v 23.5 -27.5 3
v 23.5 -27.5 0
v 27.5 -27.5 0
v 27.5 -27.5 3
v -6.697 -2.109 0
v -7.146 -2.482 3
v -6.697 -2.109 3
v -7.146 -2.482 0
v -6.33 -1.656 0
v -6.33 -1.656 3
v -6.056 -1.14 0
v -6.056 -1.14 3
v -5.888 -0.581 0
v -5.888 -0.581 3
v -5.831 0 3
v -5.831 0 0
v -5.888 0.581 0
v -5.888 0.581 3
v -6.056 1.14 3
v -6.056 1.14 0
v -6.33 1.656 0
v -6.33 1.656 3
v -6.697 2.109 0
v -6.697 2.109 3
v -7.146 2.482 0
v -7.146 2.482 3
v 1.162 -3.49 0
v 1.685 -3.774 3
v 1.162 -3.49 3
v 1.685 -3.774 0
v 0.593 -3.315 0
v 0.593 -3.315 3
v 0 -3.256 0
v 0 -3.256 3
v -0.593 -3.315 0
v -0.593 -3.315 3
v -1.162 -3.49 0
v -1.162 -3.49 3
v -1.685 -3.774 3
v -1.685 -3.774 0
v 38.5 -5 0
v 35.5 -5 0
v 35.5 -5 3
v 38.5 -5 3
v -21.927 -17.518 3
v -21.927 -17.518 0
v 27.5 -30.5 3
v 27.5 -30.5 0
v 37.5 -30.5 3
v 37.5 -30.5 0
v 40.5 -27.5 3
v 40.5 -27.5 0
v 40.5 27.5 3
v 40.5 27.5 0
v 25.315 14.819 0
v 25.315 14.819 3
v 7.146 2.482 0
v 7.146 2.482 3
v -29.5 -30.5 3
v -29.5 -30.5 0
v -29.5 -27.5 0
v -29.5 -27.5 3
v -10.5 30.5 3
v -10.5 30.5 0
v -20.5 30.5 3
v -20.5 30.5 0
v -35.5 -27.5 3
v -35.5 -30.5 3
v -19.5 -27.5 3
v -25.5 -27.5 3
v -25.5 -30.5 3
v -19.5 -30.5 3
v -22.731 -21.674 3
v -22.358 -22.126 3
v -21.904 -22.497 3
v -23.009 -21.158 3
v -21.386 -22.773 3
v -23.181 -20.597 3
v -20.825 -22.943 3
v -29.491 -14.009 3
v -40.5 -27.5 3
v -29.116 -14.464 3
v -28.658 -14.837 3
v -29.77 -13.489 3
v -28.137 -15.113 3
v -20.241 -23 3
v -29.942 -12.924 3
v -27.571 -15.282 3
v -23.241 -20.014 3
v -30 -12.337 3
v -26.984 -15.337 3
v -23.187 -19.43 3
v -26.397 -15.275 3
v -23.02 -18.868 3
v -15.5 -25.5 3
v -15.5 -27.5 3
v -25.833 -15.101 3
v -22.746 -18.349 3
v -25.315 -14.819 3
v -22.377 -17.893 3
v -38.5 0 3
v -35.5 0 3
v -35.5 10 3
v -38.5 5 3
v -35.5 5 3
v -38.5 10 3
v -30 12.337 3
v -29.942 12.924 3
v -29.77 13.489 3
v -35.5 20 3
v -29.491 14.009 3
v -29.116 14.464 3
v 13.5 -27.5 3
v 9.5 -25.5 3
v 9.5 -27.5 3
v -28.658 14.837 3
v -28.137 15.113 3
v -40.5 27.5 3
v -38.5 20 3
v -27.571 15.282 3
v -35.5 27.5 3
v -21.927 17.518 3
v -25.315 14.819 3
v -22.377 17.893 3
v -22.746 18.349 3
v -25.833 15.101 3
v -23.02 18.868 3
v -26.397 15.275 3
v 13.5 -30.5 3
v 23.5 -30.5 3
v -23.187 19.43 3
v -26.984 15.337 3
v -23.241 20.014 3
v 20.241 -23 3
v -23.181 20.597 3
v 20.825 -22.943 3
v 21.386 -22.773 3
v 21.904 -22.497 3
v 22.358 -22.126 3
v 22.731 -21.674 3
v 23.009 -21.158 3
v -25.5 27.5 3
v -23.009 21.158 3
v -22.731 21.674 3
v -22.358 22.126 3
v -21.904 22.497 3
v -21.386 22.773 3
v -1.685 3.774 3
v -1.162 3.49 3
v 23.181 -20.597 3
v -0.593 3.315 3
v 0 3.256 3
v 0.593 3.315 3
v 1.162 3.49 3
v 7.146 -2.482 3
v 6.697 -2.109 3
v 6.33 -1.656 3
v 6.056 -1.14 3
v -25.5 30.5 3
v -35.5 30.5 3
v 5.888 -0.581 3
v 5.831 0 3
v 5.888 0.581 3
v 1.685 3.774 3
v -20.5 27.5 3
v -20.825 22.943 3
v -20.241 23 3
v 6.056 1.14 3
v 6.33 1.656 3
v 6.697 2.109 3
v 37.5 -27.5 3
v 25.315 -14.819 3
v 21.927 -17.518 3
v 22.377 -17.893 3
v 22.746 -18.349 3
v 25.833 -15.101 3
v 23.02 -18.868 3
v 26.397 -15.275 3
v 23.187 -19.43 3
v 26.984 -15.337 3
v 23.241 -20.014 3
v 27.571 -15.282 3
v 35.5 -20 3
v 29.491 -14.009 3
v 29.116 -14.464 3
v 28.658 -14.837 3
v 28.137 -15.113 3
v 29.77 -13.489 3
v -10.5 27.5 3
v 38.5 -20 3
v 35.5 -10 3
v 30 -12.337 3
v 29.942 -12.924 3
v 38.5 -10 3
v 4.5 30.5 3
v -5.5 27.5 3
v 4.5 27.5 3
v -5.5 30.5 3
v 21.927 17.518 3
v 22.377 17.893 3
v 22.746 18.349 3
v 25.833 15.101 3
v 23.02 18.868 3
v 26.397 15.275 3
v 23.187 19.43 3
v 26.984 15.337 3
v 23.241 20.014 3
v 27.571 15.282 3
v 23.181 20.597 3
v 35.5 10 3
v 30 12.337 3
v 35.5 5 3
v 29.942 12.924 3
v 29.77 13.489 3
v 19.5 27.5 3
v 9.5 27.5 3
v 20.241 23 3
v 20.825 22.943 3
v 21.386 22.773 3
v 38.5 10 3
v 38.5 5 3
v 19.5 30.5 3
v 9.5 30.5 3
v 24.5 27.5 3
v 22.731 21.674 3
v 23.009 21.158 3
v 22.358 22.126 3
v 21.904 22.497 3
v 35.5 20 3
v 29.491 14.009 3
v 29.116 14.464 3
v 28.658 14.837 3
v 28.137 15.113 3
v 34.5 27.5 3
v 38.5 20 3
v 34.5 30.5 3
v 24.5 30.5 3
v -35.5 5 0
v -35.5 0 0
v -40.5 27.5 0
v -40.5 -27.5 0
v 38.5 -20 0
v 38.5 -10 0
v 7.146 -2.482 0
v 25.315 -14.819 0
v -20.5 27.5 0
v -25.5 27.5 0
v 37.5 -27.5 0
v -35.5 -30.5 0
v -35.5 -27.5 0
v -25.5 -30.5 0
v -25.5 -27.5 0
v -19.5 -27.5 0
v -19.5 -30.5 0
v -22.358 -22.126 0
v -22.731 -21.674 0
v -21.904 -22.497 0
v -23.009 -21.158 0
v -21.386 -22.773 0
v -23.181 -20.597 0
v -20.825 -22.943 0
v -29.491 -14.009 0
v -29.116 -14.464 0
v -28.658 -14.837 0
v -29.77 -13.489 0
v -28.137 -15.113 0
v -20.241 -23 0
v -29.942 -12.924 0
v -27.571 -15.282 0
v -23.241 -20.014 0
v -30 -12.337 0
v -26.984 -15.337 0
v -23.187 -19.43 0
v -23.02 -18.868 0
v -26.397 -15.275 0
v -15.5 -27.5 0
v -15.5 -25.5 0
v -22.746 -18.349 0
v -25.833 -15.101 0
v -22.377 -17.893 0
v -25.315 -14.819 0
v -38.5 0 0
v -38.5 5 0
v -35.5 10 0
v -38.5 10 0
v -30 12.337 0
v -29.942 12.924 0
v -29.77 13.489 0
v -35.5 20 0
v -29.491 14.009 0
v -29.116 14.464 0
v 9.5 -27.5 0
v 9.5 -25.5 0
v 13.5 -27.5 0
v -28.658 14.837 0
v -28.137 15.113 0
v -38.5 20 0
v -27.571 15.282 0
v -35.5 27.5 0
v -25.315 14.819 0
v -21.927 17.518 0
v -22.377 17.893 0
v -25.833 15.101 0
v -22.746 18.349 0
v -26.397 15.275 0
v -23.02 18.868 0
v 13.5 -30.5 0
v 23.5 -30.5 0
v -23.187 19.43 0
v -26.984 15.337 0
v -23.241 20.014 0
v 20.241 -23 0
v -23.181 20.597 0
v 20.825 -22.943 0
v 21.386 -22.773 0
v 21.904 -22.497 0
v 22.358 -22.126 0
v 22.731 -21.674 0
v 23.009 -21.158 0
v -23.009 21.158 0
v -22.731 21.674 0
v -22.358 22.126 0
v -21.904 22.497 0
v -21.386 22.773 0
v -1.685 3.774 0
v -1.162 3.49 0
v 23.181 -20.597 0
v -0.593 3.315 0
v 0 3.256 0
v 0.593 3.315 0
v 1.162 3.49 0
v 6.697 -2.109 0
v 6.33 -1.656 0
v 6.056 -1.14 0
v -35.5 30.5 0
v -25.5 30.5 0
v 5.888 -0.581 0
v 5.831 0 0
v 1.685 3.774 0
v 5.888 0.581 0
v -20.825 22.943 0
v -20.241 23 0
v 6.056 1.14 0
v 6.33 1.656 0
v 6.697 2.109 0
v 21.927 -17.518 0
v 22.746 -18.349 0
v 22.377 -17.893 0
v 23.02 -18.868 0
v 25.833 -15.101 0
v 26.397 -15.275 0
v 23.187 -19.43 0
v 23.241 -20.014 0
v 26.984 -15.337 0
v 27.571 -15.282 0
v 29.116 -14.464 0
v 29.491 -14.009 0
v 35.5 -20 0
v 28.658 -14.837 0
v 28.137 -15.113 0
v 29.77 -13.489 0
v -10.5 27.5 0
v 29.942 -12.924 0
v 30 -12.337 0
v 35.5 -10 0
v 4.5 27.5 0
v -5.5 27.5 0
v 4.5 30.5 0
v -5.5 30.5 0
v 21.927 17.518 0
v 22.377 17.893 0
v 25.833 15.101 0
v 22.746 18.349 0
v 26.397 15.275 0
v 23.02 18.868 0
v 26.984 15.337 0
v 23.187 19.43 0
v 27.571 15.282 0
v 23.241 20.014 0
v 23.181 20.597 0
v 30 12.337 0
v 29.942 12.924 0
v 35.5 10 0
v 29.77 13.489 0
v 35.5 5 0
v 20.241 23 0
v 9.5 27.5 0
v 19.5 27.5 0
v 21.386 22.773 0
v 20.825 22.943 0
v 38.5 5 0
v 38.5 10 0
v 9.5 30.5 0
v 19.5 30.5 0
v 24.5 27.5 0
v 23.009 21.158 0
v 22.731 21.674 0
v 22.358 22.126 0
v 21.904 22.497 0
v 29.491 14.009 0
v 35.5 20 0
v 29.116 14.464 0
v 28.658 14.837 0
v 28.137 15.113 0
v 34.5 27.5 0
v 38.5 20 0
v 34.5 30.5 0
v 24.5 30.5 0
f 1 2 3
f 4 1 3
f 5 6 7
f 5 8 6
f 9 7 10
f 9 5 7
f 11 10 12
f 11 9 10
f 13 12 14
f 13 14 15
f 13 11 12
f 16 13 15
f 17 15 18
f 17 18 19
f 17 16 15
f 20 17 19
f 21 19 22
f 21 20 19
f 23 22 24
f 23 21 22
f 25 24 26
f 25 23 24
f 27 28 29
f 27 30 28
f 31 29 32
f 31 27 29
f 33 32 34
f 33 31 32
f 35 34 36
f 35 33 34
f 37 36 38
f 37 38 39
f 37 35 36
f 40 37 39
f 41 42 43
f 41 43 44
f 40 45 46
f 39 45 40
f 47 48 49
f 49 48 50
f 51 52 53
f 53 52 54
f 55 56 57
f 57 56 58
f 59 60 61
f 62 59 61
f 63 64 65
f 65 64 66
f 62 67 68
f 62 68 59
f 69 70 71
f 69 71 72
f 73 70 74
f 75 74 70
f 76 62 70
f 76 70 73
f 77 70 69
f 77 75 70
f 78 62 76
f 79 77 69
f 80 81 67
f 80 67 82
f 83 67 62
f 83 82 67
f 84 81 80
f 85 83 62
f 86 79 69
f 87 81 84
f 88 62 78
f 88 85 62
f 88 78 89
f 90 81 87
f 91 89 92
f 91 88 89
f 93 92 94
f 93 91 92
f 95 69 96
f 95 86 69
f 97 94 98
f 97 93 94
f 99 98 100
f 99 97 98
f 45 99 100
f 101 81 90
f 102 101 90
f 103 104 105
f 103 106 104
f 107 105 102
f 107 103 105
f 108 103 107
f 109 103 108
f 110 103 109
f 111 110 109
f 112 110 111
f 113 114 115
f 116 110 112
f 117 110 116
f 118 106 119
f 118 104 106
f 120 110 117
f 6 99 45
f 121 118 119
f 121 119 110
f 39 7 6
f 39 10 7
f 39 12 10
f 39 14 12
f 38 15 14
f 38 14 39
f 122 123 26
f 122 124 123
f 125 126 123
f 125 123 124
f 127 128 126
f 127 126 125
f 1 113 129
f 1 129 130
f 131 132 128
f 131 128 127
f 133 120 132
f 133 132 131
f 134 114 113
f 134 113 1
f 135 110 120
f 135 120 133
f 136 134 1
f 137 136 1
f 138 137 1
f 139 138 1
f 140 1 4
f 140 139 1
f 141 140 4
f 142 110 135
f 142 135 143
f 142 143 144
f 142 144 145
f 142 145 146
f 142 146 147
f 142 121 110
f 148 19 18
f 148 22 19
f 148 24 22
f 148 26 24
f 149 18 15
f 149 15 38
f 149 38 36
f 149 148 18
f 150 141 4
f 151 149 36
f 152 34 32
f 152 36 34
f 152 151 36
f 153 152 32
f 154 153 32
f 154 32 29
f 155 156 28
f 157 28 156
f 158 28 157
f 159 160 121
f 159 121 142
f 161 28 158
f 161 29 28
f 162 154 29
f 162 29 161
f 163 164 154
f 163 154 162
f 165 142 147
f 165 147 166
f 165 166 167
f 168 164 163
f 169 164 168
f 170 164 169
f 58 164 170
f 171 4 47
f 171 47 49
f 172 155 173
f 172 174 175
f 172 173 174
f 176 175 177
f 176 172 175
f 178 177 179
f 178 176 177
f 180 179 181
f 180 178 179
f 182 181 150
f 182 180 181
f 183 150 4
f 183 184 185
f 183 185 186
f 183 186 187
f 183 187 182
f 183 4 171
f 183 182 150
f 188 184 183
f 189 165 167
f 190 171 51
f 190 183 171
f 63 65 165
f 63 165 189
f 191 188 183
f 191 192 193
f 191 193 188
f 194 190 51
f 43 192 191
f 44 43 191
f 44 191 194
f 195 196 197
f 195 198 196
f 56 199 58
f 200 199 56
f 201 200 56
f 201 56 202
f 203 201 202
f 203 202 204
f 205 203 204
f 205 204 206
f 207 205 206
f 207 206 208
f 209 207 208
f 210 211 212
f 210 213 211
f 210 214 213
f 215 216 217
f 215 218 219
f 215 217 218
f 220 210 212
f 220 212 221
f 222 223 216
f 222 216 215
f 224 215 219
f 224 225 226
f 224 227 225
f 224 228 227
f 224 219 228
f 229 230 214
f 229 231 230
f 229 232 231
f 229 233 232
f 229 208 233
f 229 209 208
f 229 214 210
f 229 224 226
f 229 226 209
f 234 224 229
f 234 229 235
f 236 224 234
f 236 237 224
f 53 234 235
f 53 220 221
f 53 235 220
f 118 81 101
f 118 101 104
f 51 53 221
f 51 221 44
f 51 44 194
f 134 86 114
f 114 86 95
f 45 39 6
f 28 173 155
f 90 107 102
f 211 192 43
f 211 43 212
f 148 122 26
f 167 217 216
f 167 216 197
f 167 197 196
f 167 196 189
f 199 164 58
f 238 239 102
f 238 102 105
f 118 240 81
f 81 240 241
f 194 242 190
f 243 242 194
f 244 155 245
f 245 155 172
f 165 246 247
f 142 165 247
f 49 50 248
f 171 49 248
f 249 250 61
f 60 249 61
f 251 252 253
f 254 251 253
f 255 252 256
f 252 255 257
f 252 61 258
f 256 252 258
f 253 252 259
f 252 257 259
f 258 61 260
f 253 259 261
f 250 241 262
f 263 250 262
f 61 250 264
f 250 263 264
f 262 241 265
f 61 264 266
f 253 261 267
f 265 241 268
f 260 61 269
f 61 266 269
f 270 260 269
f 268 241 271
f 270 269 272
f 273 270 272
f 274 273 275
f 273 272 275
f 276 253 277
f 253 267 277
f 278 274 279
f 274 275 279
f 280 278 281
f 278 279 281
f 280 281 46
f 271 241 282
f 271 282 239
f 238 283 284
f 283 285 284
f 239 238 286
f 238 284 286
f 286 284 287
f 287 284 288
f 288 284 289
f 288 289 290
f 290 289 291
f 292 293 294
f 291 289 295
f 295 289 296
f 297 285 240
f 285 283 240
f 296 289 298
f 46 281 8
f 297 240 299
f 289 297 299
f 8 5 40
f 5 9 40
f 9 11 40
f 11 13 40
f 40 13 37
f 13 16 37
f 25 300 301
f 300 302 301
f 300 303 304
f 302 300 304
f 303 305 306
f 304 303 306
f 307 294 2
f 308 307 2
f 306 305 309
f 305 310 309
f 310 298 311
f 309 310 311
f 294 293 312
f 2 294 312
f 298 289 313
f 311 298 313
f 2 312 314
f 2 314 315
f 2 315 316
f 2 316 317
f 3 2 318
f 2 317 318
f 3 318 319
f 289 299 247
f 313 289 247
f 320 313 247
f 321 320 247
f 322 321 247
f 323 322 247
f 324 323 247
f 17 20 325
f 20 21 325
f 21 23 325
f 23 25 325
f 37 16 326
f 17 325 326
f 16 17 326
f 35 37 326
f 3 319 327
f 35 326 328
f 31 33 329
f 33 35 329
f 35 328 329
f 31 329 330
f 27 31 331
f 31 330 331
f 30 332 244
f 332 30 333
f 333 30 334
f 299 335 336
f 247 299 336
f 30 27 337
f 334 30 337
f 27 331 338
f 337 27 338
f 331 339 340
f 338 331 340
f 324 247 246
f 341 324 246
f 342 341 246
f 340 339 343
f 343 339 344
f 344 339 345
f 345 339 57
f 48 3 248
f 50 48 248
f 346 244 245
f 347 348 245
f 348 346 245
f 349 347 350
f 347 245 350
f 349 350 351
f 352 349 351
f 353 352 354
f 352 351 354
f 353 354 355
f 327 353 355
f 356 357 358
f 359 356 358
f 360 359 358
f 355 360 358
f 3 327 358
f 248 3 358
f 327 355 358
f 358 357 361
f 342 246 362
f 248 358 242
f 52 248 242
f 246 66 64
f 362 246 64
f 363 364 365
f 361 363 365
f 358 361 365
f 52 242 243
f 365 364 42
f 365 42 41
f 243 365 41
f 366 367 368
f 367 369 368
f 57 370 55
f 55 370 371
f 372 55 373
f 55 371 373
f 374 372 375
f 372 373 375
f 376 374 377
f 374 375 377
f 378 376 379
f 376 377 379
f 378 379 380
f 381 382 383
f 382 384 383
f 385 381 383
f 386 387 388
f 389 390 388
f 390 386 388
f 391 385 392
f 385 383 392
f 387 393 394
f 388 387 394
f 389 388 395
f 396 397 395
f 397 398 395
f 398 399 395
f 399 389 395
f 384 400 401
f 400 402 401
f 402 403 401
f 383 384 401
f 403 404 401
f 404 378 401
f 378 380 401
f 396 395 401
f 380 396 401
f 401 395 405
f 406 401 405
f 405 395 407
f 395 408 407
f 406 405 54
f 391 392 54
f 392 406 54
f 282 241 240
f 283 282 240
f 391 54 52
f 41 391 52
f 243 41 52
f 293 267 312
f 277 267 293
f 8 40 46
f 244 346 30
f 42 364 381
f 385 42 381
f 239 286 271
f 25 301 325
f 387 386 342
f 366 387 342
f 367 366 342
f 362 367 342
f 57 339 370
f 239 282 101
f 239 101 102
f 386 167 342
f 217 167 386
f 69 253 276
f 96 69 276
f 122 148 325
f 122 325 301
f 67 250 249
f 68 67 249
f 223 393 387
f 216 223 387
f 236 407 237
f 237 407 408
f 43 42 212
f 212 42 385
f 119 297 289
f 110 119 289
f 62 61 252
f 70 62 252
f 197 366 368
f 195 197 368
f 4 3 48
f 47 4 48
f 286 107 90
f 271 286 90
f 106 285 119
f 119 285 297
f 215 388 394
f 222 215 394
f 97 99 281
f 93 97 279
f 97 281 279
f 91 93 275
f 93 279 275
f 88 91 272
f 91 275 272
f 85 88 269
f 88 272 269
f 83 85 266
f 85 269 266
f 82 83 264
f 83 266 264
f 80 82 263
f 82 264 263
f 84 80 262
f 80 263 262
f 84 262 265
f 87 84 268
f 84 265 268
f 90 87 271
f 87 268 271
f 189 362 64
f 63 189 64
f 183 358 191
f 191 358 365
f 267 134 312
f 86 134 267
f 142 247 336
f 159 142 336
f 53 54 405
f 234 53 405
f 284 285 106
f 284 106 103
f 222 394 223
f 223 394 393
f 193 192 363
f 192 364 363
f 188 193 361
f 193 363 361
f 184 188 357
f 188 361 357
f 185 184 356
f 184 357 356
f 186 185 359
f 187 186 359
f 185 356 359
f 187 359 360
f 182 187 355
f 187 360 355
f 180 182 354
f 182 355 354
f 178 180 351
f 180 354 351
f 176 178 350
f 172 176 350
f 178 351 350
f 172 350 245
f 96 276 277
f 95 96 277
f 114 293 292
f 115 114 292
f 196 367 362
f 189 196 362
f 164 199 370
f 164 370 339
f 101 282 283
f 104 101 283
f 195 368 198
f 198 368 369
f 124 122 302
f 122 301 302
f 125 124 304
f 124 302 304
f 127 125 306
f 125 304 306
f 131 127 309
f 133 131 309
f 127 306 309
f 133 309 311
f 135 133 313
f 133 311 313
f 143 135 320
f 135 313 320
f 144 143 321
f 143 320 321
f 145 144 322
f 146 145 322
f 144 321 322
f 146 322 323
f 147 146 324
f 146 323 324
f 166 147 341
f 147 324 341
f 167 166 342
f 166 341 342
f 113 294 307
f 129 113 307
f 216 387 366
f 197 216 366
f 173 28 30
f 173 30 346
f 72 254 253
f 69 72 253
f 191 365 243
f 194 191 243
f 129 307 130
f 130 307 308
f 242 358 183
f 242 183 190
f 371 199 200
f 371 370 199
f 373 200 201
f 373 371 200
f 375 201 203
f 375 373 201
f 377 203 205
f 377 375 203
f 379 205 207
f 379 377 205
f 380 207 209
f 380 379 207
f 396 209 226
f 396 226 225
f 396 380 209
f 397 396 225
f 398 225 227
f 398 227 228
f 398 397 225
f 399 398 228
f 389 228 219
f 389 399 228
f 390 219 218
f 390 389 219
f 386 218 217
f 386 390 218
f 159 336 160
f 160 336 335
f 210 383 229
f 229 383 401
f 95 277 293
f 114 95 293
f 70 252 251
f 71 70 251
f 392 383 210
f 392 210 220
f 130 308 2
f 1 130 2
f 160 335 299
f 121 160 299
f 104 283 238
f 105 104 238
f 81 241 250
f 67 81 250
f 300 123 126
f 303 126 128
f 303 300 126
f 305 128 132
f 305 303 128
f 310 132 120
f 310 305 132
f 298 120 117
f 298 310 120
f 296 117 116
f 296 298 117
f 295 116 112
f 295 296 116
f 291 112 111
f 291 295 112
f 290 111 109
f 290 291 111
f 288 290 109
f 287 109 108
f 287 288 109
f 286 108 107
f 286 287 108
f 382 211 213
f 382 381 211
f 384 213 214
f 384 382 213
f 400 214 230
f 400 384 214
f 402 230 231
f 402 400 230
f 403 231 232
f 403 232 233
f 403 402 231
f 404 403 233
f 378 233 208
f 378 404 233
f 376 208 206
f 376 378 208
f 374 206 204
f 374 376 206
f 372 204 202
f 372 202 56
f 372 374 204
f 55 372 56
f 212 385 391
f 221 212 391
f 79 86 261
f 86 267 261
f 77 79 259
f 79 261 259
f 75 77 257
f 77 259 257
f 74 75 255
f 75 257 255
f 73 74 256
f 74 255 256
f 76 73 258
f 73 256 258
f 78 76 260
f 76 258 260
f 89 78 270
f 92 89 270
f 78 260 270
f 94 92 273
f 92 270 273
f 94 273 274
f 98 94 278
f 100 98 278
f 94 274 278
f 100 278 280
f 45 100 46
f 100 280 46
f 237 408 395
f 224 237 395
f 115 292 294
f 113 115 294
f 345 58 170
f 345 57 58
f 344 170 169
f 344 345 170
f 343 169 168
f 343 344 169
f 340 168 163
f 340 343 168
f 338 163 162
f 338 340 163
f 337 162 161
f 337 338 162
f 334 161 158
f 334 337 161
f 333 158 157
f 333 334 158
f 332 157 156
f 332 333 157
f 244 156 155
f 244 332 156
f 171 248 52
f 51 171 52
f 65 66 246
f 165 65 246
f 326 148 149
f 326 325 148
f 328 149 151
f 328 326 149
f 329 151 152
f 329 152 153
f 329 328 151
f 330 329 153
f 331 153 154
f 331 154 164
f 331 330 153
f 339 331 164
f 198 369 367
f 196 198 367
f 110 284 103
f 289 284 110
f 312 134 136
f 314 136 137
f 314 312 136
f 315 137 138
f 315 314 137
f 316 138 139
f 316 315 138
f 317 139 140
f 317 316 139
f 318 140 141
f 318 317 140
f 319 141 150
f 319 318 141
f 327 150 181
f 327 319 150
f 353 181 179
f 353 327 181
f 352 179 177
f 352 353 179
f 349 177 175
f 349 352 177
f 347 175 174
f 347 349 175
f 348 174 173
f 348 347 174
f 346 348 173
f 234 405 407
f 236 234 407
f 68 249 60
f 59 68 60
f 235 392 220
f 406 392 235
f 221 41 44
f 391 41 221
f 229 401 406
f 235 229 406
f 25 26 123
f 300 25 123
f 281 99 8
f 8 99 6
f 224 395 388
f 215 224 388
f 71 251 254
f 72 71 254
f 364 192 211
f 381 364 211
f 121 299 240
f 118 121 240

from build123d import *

# Parameters (mm, degrees)
SKETCH_1_W          = 3
SKETCH_1_H          = 10
SKETCH_1_H_2        = 5
EXTRUDE_1_DEPTH     = 3
CUT_EXTRUDE_1_DEPTH = 10
FILLET_1_R          = 3


with BuildPart() as part:
    # 草图1 → 凸台-拉伸1 (new body)
    with BuildSketch(Plane.XY):
        Polygon((-10.5, 27.5), (-10.5, 30.5), (-20.5, 30.5), (-20.5, 27.5), (-25.5, 27.5), (-25.5, 30.5), (-35.5, 30.5), (-35.5, 27.5), (-40.5, 27.5), (-40.5, -27.5), (-35.5, -27.5), (-35.5, -30.5), (-29.5, -30.5), (-29.5, -27.5), (-25.5, -27.5), (-25.5, -30.5), (-19.5, -30.5), (-19.5, -27.5), (-15.5, -27.5), (-15.5, -25.5), (9.5, -25.5), (9.5, -27.5), (13.5, -27.5), (13.5, -30.5), (23.5, -30.5), (23.5, -27.5), (27.5, -27.5), (27.5, -30.5), (37.5, -30.5), (37.5, -27.5), (40.5, -27.5), (40.5, 27.5), (34.5, 27.5), (34.5, 30.5), (24.5, 30.5), (24.5, 27.5), (19.5, 27.5), (19.5, 30.5), (9.5, 30.5), (9.5, 27.5), (4.5, 27.5), (4.5, 30.5), (-5.5, 30.5), (-5.5, 27.5), align=None)
        with Locations((37, 0)):
            Rectangle(SKETCH_1_W, SKETCH_1_H, mode=Mode.SUBTRACT)
        with Locations((37, 15)):
            Rectangle(SKETCH_1_W, SKETCH_1_H, mode=Mode.SUBTRACT)
        with Locations((37, -15)):
            Rectangle(SKETCH_1_W, SKETCH_1_H, mode=Mode.SUBTRACT)
        with Locations((-37, 2.5)):
            Rectangle(SKETCH_1_W, SKETCH_1_H_2, mode=Mode.SUBTRACT)
        with Locations((-37, 15)):
            Rectangle(SKETCH_1_W, SKETCH_1_H, mode=Mode.SUBTRACT)
    extrude(amount=EXTRUDE_1_DEPTH)

    # 草图2 → 切除-拉伸1 (cut)
    with BuildSketch(Plane.XY.offset(3)):
        Polygon((-30, 23), (30, 23), (0, 2.62962963), align=None)
        Polygon((-30, -23), (0, -2.62962963), (30, -23), align=None)
        Polygon((30, -18), (30, 18), (3.490909091, 0), align=None)
        Polygon((-30, -18), (-3.490909091, 0), (-30, 18), align=None)
    extrude(amount=-CUT_EXTRUDE_1_DEPTH, mode=Mode.SUBTRACT)

    # 圆角1
    fillet_1_edges = [part.edges().sort_by_distance(p)[0] for p in [
        (30, -18, 1.5),
        (3.490909091, 0, 1.5),
        (30, 18, 1.5),
        (30, -23, 1.5),
        (-30, -23, 1.5),
        (0, -2.62962963, 1.5),
        (-30, -18, 1.5),
        (-30, 18, 1.5),
        (-3.490909091, 0, 1.5),
        (30, 23, 1.5),
        (0, 2.62962963, 1.5),
        (-30, 23, 1.5),
    ]]
    fillet(fillet_1_edges, radius=FILLET_1_R)


solid = part.part
